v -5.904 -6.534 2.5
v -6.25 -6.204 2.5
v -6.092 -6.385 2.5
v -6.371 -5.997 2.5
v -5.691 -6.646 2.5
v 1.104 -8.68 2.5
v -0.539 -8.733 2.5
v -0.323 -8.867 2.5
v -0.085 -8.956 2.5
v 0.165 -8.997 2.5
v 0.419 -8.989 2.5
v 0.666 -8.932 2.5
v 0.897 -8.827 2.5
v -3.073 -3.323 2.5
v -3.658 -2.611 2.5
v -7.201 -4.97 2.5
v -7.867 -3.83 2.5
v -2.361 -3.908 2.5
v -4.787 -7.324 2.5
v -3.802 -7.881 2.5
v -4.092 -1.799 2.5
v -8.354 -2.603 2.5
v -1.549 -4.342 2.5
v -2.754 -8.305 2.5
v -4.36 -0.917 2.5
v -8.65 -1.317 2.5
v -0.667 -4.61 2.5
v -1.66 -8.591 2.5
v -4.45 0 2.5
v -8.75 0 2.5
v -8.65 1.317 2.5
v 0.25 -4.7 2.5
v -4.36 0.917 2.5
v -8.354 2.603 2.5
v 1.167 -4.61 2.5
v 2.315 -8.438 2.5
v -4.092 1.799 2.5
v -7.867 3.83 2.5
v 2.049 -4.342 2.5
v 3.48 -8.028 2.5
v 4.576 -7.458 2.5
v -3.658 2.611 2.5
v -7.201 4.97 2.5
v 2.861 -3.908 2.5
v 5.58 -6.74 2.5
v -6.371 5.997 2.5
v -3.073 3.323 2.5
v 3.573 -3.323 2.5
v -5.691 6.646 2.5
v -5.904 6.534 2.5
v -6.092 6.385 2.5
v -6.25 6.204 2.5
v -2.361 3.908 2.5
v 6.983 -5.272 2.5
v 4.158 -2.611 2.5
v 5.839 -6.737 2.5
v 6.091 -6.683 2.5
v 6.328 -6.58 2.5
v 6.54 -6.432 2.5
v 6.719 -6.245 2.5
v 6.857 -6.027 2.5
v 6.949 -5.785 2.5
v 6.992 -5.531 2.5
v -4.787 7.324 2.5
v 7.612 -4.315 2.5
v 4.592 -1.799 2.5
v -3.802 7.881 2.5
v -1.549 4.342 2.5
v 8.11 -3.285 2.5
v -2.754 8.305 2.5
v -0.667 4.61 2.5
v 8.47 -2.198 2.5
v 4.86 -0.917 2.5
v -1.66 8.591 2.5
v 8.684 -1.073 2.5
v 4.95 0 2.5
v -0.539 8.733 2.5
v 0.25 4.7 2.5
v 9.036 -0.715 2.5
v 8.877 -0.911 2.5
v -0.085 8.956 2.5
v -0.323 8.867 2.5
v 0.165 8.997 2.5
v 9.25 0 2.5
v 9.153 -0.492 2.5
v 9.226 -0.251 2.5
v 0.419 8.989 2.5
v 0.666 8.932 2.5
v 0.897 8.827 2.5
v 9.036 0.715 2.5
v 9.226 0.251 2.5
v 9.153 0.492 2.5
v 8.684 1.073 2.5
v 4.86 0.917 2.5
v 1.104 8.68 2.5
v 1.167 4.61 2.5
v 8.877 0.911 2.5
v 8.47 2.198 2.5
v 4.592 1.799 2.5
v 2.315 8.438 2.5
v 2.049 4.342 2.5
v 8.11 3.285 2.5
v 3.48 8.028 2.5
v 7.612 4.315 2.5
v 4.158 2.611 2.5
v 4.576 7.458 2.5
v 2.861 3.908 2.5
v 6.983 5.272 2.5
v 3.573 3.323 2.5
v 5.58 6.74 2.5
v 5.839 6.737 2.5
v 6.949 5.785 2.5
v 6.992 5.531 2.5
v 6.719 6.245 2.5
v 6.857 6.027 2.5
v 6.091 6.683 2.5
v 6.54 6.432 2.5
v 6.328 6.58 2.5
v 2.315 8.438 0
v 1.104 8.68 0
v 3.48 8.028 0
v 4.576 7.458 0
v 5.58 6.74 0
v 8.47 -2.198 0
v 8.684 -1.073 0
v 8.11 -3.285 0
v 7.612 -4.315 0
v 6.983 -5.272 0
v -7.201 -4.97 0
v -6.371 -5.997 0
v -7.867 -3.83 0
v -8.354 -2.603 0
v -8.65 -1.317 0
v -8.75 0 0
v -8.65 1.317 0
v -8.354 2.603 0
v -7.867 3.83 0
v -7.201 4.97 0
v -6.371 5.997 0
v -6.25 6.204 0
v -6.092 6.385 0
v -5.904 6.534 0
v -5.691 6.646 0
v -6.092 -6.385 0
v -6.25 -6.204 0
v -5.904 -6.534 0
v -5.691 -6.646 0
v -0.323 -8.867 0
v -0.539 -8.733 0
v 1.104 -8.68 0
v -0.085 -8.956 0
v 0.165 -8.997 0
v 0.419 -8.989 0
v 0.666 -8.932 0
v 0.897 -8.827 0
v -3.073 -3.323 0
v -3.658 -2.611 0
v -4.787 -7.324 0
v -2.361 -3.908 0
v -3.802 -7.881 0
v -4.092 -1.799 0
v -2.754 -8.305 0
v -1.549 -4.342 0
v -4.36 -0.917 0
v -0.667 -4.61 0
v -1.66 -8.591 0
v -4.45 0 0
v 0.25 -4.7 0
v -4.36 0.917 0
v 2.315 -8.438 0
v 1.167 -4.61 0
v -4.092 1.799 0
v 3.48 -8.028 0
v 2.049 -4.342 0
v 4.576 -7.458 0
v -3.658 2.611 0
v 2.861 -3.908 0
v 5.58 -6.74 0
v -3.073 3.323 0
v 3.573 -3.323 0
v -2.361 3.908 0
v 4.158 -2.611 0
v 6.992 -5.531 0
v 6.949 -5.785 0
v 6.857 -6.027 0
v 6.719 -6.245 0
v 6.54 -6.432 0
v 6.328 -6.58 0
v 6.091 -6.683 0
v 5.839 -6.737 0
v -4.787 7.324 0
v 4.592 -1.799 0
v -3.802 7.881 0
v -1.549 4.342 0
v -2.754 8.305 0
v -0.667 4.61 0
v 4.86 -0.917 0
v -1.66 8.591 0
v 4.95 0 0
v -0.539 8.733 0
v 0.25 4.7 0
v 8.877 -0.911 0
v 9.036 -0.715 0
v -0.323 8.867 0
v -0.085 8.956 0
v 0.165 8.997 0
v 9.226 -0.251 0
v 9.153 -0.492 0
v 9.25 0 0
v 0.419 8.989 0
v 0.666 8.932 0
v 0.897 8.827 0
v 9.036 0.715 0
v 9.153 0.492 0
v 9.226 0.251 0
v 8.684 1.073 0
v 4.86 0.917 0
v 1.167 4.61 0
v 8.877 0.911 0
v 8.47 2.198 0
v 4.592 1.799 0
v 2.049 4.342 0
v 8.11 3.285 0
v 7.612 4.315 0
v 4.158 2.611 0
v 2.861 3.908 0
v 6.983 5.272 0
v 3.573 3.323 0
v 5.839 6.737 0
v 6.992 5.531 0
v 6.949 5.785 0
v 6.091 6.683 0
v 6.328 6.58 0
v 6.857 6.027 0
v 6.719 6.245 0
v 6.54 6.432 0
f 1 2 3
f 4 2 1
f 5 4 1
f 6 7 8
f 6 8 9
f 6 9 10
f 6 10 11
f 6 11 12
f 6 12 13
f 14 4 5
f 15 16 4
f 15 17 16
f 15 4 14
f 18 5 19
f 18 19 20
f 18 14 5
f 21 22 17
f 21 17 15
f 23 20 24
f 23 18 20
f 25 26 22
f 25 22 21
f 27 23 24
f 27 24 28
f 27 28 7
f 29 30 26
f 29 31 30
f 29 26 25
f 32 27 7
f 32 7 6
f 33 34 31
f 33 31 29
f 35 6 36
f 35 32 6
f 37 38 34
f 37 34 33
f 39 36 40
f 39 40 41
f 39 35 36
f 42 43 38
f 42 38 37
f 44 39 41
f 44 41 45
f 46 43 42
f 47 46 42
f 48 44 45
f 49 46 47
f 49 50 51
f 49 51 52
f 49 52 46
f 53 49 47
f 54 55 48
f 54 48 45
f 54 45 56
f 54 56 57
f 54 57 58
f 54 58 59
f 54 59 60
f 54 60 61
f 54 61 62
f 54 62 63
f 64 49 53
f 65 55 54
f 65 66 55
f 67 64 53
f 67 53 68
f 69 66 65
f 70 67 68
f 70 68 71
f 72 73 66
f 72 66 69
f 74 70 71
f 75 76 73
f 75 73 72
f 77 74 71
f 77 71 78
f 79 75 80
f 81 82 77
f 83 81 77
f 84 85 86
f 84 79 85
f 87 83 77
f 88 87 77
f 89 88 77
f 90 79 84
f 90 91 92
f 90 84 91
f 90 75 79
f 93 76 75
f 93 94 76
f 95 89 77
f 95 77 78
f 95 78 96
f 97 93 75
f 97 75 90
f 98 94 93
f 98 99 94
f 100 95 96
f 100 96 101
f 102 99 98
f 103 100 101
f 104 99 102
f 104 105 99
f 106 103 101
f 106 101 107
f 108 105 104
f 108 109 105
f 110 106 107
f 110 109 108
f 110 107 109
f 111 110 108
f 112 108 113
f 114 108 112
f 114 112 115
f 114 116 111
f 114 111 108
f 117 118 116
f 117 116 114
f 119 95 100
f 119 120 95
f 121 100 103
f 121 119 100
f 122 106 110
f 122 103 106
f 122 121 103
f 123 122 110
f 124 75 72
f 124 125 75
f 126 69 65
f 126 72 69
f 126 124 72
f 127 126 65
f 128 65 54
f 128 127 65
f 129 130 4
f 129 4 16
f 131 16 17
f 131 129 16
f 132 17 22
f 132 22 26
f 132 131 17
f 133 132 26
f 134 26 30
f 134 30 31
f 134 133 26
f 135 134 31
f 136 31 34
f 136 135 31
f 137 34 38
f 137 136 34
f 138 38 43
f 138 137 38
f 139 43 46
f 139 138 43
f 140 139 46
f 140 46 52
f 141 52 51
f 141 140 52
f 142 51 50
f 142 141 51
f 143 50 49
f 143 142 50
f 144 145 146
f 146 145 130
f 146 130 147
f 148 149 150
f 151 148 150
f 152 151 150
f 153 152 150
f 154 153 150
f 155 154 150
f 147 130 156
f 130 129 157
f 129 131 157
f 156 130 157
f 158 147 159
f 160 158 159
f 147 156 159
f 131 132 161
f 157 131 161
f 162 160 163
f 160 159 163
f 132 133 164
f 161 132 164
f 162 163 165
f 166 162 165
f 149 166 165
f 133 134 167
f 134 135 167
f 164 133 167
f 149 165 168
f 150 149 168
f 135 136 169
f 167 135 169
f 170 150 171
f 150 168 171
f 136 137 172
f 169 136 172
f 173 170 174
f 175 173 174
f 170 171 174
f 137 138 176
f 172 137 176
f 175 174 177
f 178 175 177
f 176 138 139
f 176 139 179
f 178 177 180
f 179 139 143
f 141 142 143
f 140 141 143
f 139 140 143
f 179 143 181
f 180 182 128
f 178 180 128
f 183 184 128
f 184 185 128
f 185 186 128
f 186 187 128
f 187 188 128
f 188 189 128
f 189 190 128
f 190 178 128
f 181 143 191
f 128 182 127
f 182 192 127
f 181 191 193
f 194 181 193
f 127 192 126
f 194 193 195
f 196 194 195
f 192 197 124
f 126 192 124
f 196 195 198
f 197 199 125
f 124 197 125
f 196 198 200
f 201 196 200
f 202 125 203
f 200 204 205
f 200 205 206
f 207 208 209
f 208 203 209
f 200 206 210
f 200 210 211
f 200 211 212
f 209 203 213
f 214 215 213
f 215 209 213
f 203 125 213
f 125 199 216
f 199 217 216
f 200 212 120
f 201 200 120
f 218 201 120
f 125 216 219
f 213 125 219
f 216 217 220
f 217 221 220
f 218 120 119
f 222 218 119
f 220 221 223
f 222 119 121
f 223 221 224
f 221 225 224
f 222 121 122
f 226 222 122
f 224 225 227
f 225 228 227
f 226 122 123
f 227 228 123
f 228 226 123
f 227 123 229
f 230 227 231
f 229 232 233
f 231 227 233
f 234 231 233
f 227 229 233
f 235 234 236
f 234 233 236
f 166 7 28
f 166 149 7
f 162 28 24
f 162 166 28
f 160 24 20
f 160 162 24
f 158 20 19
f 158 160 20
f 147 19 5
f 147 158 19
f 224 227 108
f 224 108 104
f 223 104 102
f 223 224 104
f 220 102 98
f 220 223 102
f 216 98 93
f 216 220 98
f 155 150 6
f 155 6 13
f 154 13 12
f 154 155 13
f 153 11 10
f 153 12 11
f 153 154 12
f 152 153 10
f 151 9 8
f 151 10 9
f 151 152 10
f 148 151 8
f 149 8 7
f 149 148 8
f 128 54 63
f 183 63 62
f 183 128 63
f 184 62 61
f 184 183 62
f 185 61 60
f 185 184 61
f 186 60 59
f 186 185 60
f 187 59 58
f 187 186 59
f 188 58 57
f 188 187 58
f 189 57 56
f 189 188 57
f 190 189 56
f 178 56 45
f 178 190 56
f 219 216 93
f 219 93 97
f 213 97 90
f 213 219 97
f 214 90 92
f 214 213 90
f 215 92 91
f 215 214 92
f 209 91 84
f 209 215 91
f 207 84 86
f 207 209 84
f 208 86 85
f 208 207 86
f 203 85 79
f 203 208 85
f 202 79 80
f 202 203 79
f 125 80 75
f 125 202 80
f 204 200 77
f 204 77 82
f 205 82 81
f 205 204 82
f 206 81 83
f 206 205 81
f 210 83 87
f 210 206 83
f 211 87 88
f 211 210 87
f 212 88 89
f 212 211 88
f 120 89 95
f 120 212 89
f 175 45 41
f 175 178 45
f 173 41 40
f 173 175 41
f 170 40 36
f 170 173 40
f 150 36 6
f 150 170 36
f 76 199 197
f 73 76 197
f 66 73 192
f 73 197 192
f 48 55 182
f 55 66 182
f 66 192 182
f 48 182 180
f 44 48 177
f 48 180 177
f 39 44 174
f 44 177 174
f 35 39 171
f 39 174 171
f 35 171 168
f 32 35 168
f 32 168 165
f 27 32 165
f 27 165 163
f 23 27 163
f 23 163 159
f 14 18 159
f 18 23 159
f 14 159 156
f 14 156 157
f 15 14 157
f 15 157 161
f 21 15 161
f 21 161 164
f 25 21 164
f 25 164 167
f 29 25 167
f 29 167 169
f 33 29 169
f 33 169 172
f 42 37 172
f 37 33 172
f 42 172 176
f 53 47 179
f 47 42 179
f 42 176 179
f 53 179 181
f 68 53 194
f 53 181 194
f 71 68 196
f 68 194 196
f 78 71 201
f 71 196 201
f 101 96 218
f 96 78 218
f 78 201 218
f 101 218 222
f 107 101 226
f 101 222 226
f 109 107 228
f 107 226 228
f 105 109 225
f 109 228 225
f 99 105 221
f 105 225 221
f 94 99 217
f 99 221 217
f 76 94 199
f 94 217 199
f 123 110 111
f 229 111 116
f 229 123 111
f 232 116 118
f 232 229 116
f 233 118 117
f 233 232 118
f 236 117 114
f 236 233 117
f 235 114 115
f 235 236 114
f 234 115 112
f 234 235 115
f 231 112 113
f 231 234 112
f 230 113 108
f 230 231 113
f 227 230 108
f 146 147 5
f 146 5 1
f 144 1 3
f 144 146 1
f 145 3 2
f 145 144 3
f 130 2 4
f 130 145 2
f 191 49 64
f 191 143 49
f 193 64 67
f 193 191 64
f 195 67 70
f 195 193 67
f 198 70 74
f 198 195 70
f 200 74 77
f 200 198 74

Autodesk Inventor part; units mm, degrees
ref_plane "YZ Plane" through (0, 0, 0) normal (1, 0, 0) x (0, 1, 0)
ref_plane "XZ Plane" through (0, 0, 0) normal (0, 1, 0) x (-1, 0, 0)
ref_plane "XY Plane" through (0, 0, 0) normal (0, 0, 1) x (1, 0, 0)
sketch "Sketch1" plane through (0, 0, 0) normal (0, 0, 1) x (1, 0, 0)
  circle A0 centre (0, 0) radius 8.75
  circle A1 centre (0.25, 0) radius 24.8
  circle A2 centre (0.25, 0) radius 4.7
  circle A3 centre (-7.45, 0) radius 1.3
  circle A4 centre (-5.1947, -5.4447) radius 1.3
  circle A5 centre (0.25, -7.7) radius 1.3
  circle A6 centre (5.6947, -5.4447) radius 1.3
  circle A7 centre (7.95, 0) radius 1.3
  circle A8 centre (5.6947, 5.4447) radius 1.3
  circle A9 centre (0.25, 7.7) radius 1.3
  circle A10 centre (-5.1947, 5.4447) radius 1.3
  dimension "d0" = 17.5
  dimension "d1" = 49.6
  dimension "d3" = 9.4
  dimension "d4" = 2.6
  dimension "d7" = 360
extrude "Extrusion1" add sketch "Sketch1" along normal blind 2.5 contours A0 A7 | A0 A7 | A3 | A7 A0 A6 A5 A4 A10 A9 A8 | A8 A0 | A0 A8 | A6 A0 | A0 A6 | A9 A0 | A0 A9 | A5 A0 | A0 A5 | A10 A0 | A0 A10 | A4 A0 | A0 A4
properties part number "BigGearCenterer"
